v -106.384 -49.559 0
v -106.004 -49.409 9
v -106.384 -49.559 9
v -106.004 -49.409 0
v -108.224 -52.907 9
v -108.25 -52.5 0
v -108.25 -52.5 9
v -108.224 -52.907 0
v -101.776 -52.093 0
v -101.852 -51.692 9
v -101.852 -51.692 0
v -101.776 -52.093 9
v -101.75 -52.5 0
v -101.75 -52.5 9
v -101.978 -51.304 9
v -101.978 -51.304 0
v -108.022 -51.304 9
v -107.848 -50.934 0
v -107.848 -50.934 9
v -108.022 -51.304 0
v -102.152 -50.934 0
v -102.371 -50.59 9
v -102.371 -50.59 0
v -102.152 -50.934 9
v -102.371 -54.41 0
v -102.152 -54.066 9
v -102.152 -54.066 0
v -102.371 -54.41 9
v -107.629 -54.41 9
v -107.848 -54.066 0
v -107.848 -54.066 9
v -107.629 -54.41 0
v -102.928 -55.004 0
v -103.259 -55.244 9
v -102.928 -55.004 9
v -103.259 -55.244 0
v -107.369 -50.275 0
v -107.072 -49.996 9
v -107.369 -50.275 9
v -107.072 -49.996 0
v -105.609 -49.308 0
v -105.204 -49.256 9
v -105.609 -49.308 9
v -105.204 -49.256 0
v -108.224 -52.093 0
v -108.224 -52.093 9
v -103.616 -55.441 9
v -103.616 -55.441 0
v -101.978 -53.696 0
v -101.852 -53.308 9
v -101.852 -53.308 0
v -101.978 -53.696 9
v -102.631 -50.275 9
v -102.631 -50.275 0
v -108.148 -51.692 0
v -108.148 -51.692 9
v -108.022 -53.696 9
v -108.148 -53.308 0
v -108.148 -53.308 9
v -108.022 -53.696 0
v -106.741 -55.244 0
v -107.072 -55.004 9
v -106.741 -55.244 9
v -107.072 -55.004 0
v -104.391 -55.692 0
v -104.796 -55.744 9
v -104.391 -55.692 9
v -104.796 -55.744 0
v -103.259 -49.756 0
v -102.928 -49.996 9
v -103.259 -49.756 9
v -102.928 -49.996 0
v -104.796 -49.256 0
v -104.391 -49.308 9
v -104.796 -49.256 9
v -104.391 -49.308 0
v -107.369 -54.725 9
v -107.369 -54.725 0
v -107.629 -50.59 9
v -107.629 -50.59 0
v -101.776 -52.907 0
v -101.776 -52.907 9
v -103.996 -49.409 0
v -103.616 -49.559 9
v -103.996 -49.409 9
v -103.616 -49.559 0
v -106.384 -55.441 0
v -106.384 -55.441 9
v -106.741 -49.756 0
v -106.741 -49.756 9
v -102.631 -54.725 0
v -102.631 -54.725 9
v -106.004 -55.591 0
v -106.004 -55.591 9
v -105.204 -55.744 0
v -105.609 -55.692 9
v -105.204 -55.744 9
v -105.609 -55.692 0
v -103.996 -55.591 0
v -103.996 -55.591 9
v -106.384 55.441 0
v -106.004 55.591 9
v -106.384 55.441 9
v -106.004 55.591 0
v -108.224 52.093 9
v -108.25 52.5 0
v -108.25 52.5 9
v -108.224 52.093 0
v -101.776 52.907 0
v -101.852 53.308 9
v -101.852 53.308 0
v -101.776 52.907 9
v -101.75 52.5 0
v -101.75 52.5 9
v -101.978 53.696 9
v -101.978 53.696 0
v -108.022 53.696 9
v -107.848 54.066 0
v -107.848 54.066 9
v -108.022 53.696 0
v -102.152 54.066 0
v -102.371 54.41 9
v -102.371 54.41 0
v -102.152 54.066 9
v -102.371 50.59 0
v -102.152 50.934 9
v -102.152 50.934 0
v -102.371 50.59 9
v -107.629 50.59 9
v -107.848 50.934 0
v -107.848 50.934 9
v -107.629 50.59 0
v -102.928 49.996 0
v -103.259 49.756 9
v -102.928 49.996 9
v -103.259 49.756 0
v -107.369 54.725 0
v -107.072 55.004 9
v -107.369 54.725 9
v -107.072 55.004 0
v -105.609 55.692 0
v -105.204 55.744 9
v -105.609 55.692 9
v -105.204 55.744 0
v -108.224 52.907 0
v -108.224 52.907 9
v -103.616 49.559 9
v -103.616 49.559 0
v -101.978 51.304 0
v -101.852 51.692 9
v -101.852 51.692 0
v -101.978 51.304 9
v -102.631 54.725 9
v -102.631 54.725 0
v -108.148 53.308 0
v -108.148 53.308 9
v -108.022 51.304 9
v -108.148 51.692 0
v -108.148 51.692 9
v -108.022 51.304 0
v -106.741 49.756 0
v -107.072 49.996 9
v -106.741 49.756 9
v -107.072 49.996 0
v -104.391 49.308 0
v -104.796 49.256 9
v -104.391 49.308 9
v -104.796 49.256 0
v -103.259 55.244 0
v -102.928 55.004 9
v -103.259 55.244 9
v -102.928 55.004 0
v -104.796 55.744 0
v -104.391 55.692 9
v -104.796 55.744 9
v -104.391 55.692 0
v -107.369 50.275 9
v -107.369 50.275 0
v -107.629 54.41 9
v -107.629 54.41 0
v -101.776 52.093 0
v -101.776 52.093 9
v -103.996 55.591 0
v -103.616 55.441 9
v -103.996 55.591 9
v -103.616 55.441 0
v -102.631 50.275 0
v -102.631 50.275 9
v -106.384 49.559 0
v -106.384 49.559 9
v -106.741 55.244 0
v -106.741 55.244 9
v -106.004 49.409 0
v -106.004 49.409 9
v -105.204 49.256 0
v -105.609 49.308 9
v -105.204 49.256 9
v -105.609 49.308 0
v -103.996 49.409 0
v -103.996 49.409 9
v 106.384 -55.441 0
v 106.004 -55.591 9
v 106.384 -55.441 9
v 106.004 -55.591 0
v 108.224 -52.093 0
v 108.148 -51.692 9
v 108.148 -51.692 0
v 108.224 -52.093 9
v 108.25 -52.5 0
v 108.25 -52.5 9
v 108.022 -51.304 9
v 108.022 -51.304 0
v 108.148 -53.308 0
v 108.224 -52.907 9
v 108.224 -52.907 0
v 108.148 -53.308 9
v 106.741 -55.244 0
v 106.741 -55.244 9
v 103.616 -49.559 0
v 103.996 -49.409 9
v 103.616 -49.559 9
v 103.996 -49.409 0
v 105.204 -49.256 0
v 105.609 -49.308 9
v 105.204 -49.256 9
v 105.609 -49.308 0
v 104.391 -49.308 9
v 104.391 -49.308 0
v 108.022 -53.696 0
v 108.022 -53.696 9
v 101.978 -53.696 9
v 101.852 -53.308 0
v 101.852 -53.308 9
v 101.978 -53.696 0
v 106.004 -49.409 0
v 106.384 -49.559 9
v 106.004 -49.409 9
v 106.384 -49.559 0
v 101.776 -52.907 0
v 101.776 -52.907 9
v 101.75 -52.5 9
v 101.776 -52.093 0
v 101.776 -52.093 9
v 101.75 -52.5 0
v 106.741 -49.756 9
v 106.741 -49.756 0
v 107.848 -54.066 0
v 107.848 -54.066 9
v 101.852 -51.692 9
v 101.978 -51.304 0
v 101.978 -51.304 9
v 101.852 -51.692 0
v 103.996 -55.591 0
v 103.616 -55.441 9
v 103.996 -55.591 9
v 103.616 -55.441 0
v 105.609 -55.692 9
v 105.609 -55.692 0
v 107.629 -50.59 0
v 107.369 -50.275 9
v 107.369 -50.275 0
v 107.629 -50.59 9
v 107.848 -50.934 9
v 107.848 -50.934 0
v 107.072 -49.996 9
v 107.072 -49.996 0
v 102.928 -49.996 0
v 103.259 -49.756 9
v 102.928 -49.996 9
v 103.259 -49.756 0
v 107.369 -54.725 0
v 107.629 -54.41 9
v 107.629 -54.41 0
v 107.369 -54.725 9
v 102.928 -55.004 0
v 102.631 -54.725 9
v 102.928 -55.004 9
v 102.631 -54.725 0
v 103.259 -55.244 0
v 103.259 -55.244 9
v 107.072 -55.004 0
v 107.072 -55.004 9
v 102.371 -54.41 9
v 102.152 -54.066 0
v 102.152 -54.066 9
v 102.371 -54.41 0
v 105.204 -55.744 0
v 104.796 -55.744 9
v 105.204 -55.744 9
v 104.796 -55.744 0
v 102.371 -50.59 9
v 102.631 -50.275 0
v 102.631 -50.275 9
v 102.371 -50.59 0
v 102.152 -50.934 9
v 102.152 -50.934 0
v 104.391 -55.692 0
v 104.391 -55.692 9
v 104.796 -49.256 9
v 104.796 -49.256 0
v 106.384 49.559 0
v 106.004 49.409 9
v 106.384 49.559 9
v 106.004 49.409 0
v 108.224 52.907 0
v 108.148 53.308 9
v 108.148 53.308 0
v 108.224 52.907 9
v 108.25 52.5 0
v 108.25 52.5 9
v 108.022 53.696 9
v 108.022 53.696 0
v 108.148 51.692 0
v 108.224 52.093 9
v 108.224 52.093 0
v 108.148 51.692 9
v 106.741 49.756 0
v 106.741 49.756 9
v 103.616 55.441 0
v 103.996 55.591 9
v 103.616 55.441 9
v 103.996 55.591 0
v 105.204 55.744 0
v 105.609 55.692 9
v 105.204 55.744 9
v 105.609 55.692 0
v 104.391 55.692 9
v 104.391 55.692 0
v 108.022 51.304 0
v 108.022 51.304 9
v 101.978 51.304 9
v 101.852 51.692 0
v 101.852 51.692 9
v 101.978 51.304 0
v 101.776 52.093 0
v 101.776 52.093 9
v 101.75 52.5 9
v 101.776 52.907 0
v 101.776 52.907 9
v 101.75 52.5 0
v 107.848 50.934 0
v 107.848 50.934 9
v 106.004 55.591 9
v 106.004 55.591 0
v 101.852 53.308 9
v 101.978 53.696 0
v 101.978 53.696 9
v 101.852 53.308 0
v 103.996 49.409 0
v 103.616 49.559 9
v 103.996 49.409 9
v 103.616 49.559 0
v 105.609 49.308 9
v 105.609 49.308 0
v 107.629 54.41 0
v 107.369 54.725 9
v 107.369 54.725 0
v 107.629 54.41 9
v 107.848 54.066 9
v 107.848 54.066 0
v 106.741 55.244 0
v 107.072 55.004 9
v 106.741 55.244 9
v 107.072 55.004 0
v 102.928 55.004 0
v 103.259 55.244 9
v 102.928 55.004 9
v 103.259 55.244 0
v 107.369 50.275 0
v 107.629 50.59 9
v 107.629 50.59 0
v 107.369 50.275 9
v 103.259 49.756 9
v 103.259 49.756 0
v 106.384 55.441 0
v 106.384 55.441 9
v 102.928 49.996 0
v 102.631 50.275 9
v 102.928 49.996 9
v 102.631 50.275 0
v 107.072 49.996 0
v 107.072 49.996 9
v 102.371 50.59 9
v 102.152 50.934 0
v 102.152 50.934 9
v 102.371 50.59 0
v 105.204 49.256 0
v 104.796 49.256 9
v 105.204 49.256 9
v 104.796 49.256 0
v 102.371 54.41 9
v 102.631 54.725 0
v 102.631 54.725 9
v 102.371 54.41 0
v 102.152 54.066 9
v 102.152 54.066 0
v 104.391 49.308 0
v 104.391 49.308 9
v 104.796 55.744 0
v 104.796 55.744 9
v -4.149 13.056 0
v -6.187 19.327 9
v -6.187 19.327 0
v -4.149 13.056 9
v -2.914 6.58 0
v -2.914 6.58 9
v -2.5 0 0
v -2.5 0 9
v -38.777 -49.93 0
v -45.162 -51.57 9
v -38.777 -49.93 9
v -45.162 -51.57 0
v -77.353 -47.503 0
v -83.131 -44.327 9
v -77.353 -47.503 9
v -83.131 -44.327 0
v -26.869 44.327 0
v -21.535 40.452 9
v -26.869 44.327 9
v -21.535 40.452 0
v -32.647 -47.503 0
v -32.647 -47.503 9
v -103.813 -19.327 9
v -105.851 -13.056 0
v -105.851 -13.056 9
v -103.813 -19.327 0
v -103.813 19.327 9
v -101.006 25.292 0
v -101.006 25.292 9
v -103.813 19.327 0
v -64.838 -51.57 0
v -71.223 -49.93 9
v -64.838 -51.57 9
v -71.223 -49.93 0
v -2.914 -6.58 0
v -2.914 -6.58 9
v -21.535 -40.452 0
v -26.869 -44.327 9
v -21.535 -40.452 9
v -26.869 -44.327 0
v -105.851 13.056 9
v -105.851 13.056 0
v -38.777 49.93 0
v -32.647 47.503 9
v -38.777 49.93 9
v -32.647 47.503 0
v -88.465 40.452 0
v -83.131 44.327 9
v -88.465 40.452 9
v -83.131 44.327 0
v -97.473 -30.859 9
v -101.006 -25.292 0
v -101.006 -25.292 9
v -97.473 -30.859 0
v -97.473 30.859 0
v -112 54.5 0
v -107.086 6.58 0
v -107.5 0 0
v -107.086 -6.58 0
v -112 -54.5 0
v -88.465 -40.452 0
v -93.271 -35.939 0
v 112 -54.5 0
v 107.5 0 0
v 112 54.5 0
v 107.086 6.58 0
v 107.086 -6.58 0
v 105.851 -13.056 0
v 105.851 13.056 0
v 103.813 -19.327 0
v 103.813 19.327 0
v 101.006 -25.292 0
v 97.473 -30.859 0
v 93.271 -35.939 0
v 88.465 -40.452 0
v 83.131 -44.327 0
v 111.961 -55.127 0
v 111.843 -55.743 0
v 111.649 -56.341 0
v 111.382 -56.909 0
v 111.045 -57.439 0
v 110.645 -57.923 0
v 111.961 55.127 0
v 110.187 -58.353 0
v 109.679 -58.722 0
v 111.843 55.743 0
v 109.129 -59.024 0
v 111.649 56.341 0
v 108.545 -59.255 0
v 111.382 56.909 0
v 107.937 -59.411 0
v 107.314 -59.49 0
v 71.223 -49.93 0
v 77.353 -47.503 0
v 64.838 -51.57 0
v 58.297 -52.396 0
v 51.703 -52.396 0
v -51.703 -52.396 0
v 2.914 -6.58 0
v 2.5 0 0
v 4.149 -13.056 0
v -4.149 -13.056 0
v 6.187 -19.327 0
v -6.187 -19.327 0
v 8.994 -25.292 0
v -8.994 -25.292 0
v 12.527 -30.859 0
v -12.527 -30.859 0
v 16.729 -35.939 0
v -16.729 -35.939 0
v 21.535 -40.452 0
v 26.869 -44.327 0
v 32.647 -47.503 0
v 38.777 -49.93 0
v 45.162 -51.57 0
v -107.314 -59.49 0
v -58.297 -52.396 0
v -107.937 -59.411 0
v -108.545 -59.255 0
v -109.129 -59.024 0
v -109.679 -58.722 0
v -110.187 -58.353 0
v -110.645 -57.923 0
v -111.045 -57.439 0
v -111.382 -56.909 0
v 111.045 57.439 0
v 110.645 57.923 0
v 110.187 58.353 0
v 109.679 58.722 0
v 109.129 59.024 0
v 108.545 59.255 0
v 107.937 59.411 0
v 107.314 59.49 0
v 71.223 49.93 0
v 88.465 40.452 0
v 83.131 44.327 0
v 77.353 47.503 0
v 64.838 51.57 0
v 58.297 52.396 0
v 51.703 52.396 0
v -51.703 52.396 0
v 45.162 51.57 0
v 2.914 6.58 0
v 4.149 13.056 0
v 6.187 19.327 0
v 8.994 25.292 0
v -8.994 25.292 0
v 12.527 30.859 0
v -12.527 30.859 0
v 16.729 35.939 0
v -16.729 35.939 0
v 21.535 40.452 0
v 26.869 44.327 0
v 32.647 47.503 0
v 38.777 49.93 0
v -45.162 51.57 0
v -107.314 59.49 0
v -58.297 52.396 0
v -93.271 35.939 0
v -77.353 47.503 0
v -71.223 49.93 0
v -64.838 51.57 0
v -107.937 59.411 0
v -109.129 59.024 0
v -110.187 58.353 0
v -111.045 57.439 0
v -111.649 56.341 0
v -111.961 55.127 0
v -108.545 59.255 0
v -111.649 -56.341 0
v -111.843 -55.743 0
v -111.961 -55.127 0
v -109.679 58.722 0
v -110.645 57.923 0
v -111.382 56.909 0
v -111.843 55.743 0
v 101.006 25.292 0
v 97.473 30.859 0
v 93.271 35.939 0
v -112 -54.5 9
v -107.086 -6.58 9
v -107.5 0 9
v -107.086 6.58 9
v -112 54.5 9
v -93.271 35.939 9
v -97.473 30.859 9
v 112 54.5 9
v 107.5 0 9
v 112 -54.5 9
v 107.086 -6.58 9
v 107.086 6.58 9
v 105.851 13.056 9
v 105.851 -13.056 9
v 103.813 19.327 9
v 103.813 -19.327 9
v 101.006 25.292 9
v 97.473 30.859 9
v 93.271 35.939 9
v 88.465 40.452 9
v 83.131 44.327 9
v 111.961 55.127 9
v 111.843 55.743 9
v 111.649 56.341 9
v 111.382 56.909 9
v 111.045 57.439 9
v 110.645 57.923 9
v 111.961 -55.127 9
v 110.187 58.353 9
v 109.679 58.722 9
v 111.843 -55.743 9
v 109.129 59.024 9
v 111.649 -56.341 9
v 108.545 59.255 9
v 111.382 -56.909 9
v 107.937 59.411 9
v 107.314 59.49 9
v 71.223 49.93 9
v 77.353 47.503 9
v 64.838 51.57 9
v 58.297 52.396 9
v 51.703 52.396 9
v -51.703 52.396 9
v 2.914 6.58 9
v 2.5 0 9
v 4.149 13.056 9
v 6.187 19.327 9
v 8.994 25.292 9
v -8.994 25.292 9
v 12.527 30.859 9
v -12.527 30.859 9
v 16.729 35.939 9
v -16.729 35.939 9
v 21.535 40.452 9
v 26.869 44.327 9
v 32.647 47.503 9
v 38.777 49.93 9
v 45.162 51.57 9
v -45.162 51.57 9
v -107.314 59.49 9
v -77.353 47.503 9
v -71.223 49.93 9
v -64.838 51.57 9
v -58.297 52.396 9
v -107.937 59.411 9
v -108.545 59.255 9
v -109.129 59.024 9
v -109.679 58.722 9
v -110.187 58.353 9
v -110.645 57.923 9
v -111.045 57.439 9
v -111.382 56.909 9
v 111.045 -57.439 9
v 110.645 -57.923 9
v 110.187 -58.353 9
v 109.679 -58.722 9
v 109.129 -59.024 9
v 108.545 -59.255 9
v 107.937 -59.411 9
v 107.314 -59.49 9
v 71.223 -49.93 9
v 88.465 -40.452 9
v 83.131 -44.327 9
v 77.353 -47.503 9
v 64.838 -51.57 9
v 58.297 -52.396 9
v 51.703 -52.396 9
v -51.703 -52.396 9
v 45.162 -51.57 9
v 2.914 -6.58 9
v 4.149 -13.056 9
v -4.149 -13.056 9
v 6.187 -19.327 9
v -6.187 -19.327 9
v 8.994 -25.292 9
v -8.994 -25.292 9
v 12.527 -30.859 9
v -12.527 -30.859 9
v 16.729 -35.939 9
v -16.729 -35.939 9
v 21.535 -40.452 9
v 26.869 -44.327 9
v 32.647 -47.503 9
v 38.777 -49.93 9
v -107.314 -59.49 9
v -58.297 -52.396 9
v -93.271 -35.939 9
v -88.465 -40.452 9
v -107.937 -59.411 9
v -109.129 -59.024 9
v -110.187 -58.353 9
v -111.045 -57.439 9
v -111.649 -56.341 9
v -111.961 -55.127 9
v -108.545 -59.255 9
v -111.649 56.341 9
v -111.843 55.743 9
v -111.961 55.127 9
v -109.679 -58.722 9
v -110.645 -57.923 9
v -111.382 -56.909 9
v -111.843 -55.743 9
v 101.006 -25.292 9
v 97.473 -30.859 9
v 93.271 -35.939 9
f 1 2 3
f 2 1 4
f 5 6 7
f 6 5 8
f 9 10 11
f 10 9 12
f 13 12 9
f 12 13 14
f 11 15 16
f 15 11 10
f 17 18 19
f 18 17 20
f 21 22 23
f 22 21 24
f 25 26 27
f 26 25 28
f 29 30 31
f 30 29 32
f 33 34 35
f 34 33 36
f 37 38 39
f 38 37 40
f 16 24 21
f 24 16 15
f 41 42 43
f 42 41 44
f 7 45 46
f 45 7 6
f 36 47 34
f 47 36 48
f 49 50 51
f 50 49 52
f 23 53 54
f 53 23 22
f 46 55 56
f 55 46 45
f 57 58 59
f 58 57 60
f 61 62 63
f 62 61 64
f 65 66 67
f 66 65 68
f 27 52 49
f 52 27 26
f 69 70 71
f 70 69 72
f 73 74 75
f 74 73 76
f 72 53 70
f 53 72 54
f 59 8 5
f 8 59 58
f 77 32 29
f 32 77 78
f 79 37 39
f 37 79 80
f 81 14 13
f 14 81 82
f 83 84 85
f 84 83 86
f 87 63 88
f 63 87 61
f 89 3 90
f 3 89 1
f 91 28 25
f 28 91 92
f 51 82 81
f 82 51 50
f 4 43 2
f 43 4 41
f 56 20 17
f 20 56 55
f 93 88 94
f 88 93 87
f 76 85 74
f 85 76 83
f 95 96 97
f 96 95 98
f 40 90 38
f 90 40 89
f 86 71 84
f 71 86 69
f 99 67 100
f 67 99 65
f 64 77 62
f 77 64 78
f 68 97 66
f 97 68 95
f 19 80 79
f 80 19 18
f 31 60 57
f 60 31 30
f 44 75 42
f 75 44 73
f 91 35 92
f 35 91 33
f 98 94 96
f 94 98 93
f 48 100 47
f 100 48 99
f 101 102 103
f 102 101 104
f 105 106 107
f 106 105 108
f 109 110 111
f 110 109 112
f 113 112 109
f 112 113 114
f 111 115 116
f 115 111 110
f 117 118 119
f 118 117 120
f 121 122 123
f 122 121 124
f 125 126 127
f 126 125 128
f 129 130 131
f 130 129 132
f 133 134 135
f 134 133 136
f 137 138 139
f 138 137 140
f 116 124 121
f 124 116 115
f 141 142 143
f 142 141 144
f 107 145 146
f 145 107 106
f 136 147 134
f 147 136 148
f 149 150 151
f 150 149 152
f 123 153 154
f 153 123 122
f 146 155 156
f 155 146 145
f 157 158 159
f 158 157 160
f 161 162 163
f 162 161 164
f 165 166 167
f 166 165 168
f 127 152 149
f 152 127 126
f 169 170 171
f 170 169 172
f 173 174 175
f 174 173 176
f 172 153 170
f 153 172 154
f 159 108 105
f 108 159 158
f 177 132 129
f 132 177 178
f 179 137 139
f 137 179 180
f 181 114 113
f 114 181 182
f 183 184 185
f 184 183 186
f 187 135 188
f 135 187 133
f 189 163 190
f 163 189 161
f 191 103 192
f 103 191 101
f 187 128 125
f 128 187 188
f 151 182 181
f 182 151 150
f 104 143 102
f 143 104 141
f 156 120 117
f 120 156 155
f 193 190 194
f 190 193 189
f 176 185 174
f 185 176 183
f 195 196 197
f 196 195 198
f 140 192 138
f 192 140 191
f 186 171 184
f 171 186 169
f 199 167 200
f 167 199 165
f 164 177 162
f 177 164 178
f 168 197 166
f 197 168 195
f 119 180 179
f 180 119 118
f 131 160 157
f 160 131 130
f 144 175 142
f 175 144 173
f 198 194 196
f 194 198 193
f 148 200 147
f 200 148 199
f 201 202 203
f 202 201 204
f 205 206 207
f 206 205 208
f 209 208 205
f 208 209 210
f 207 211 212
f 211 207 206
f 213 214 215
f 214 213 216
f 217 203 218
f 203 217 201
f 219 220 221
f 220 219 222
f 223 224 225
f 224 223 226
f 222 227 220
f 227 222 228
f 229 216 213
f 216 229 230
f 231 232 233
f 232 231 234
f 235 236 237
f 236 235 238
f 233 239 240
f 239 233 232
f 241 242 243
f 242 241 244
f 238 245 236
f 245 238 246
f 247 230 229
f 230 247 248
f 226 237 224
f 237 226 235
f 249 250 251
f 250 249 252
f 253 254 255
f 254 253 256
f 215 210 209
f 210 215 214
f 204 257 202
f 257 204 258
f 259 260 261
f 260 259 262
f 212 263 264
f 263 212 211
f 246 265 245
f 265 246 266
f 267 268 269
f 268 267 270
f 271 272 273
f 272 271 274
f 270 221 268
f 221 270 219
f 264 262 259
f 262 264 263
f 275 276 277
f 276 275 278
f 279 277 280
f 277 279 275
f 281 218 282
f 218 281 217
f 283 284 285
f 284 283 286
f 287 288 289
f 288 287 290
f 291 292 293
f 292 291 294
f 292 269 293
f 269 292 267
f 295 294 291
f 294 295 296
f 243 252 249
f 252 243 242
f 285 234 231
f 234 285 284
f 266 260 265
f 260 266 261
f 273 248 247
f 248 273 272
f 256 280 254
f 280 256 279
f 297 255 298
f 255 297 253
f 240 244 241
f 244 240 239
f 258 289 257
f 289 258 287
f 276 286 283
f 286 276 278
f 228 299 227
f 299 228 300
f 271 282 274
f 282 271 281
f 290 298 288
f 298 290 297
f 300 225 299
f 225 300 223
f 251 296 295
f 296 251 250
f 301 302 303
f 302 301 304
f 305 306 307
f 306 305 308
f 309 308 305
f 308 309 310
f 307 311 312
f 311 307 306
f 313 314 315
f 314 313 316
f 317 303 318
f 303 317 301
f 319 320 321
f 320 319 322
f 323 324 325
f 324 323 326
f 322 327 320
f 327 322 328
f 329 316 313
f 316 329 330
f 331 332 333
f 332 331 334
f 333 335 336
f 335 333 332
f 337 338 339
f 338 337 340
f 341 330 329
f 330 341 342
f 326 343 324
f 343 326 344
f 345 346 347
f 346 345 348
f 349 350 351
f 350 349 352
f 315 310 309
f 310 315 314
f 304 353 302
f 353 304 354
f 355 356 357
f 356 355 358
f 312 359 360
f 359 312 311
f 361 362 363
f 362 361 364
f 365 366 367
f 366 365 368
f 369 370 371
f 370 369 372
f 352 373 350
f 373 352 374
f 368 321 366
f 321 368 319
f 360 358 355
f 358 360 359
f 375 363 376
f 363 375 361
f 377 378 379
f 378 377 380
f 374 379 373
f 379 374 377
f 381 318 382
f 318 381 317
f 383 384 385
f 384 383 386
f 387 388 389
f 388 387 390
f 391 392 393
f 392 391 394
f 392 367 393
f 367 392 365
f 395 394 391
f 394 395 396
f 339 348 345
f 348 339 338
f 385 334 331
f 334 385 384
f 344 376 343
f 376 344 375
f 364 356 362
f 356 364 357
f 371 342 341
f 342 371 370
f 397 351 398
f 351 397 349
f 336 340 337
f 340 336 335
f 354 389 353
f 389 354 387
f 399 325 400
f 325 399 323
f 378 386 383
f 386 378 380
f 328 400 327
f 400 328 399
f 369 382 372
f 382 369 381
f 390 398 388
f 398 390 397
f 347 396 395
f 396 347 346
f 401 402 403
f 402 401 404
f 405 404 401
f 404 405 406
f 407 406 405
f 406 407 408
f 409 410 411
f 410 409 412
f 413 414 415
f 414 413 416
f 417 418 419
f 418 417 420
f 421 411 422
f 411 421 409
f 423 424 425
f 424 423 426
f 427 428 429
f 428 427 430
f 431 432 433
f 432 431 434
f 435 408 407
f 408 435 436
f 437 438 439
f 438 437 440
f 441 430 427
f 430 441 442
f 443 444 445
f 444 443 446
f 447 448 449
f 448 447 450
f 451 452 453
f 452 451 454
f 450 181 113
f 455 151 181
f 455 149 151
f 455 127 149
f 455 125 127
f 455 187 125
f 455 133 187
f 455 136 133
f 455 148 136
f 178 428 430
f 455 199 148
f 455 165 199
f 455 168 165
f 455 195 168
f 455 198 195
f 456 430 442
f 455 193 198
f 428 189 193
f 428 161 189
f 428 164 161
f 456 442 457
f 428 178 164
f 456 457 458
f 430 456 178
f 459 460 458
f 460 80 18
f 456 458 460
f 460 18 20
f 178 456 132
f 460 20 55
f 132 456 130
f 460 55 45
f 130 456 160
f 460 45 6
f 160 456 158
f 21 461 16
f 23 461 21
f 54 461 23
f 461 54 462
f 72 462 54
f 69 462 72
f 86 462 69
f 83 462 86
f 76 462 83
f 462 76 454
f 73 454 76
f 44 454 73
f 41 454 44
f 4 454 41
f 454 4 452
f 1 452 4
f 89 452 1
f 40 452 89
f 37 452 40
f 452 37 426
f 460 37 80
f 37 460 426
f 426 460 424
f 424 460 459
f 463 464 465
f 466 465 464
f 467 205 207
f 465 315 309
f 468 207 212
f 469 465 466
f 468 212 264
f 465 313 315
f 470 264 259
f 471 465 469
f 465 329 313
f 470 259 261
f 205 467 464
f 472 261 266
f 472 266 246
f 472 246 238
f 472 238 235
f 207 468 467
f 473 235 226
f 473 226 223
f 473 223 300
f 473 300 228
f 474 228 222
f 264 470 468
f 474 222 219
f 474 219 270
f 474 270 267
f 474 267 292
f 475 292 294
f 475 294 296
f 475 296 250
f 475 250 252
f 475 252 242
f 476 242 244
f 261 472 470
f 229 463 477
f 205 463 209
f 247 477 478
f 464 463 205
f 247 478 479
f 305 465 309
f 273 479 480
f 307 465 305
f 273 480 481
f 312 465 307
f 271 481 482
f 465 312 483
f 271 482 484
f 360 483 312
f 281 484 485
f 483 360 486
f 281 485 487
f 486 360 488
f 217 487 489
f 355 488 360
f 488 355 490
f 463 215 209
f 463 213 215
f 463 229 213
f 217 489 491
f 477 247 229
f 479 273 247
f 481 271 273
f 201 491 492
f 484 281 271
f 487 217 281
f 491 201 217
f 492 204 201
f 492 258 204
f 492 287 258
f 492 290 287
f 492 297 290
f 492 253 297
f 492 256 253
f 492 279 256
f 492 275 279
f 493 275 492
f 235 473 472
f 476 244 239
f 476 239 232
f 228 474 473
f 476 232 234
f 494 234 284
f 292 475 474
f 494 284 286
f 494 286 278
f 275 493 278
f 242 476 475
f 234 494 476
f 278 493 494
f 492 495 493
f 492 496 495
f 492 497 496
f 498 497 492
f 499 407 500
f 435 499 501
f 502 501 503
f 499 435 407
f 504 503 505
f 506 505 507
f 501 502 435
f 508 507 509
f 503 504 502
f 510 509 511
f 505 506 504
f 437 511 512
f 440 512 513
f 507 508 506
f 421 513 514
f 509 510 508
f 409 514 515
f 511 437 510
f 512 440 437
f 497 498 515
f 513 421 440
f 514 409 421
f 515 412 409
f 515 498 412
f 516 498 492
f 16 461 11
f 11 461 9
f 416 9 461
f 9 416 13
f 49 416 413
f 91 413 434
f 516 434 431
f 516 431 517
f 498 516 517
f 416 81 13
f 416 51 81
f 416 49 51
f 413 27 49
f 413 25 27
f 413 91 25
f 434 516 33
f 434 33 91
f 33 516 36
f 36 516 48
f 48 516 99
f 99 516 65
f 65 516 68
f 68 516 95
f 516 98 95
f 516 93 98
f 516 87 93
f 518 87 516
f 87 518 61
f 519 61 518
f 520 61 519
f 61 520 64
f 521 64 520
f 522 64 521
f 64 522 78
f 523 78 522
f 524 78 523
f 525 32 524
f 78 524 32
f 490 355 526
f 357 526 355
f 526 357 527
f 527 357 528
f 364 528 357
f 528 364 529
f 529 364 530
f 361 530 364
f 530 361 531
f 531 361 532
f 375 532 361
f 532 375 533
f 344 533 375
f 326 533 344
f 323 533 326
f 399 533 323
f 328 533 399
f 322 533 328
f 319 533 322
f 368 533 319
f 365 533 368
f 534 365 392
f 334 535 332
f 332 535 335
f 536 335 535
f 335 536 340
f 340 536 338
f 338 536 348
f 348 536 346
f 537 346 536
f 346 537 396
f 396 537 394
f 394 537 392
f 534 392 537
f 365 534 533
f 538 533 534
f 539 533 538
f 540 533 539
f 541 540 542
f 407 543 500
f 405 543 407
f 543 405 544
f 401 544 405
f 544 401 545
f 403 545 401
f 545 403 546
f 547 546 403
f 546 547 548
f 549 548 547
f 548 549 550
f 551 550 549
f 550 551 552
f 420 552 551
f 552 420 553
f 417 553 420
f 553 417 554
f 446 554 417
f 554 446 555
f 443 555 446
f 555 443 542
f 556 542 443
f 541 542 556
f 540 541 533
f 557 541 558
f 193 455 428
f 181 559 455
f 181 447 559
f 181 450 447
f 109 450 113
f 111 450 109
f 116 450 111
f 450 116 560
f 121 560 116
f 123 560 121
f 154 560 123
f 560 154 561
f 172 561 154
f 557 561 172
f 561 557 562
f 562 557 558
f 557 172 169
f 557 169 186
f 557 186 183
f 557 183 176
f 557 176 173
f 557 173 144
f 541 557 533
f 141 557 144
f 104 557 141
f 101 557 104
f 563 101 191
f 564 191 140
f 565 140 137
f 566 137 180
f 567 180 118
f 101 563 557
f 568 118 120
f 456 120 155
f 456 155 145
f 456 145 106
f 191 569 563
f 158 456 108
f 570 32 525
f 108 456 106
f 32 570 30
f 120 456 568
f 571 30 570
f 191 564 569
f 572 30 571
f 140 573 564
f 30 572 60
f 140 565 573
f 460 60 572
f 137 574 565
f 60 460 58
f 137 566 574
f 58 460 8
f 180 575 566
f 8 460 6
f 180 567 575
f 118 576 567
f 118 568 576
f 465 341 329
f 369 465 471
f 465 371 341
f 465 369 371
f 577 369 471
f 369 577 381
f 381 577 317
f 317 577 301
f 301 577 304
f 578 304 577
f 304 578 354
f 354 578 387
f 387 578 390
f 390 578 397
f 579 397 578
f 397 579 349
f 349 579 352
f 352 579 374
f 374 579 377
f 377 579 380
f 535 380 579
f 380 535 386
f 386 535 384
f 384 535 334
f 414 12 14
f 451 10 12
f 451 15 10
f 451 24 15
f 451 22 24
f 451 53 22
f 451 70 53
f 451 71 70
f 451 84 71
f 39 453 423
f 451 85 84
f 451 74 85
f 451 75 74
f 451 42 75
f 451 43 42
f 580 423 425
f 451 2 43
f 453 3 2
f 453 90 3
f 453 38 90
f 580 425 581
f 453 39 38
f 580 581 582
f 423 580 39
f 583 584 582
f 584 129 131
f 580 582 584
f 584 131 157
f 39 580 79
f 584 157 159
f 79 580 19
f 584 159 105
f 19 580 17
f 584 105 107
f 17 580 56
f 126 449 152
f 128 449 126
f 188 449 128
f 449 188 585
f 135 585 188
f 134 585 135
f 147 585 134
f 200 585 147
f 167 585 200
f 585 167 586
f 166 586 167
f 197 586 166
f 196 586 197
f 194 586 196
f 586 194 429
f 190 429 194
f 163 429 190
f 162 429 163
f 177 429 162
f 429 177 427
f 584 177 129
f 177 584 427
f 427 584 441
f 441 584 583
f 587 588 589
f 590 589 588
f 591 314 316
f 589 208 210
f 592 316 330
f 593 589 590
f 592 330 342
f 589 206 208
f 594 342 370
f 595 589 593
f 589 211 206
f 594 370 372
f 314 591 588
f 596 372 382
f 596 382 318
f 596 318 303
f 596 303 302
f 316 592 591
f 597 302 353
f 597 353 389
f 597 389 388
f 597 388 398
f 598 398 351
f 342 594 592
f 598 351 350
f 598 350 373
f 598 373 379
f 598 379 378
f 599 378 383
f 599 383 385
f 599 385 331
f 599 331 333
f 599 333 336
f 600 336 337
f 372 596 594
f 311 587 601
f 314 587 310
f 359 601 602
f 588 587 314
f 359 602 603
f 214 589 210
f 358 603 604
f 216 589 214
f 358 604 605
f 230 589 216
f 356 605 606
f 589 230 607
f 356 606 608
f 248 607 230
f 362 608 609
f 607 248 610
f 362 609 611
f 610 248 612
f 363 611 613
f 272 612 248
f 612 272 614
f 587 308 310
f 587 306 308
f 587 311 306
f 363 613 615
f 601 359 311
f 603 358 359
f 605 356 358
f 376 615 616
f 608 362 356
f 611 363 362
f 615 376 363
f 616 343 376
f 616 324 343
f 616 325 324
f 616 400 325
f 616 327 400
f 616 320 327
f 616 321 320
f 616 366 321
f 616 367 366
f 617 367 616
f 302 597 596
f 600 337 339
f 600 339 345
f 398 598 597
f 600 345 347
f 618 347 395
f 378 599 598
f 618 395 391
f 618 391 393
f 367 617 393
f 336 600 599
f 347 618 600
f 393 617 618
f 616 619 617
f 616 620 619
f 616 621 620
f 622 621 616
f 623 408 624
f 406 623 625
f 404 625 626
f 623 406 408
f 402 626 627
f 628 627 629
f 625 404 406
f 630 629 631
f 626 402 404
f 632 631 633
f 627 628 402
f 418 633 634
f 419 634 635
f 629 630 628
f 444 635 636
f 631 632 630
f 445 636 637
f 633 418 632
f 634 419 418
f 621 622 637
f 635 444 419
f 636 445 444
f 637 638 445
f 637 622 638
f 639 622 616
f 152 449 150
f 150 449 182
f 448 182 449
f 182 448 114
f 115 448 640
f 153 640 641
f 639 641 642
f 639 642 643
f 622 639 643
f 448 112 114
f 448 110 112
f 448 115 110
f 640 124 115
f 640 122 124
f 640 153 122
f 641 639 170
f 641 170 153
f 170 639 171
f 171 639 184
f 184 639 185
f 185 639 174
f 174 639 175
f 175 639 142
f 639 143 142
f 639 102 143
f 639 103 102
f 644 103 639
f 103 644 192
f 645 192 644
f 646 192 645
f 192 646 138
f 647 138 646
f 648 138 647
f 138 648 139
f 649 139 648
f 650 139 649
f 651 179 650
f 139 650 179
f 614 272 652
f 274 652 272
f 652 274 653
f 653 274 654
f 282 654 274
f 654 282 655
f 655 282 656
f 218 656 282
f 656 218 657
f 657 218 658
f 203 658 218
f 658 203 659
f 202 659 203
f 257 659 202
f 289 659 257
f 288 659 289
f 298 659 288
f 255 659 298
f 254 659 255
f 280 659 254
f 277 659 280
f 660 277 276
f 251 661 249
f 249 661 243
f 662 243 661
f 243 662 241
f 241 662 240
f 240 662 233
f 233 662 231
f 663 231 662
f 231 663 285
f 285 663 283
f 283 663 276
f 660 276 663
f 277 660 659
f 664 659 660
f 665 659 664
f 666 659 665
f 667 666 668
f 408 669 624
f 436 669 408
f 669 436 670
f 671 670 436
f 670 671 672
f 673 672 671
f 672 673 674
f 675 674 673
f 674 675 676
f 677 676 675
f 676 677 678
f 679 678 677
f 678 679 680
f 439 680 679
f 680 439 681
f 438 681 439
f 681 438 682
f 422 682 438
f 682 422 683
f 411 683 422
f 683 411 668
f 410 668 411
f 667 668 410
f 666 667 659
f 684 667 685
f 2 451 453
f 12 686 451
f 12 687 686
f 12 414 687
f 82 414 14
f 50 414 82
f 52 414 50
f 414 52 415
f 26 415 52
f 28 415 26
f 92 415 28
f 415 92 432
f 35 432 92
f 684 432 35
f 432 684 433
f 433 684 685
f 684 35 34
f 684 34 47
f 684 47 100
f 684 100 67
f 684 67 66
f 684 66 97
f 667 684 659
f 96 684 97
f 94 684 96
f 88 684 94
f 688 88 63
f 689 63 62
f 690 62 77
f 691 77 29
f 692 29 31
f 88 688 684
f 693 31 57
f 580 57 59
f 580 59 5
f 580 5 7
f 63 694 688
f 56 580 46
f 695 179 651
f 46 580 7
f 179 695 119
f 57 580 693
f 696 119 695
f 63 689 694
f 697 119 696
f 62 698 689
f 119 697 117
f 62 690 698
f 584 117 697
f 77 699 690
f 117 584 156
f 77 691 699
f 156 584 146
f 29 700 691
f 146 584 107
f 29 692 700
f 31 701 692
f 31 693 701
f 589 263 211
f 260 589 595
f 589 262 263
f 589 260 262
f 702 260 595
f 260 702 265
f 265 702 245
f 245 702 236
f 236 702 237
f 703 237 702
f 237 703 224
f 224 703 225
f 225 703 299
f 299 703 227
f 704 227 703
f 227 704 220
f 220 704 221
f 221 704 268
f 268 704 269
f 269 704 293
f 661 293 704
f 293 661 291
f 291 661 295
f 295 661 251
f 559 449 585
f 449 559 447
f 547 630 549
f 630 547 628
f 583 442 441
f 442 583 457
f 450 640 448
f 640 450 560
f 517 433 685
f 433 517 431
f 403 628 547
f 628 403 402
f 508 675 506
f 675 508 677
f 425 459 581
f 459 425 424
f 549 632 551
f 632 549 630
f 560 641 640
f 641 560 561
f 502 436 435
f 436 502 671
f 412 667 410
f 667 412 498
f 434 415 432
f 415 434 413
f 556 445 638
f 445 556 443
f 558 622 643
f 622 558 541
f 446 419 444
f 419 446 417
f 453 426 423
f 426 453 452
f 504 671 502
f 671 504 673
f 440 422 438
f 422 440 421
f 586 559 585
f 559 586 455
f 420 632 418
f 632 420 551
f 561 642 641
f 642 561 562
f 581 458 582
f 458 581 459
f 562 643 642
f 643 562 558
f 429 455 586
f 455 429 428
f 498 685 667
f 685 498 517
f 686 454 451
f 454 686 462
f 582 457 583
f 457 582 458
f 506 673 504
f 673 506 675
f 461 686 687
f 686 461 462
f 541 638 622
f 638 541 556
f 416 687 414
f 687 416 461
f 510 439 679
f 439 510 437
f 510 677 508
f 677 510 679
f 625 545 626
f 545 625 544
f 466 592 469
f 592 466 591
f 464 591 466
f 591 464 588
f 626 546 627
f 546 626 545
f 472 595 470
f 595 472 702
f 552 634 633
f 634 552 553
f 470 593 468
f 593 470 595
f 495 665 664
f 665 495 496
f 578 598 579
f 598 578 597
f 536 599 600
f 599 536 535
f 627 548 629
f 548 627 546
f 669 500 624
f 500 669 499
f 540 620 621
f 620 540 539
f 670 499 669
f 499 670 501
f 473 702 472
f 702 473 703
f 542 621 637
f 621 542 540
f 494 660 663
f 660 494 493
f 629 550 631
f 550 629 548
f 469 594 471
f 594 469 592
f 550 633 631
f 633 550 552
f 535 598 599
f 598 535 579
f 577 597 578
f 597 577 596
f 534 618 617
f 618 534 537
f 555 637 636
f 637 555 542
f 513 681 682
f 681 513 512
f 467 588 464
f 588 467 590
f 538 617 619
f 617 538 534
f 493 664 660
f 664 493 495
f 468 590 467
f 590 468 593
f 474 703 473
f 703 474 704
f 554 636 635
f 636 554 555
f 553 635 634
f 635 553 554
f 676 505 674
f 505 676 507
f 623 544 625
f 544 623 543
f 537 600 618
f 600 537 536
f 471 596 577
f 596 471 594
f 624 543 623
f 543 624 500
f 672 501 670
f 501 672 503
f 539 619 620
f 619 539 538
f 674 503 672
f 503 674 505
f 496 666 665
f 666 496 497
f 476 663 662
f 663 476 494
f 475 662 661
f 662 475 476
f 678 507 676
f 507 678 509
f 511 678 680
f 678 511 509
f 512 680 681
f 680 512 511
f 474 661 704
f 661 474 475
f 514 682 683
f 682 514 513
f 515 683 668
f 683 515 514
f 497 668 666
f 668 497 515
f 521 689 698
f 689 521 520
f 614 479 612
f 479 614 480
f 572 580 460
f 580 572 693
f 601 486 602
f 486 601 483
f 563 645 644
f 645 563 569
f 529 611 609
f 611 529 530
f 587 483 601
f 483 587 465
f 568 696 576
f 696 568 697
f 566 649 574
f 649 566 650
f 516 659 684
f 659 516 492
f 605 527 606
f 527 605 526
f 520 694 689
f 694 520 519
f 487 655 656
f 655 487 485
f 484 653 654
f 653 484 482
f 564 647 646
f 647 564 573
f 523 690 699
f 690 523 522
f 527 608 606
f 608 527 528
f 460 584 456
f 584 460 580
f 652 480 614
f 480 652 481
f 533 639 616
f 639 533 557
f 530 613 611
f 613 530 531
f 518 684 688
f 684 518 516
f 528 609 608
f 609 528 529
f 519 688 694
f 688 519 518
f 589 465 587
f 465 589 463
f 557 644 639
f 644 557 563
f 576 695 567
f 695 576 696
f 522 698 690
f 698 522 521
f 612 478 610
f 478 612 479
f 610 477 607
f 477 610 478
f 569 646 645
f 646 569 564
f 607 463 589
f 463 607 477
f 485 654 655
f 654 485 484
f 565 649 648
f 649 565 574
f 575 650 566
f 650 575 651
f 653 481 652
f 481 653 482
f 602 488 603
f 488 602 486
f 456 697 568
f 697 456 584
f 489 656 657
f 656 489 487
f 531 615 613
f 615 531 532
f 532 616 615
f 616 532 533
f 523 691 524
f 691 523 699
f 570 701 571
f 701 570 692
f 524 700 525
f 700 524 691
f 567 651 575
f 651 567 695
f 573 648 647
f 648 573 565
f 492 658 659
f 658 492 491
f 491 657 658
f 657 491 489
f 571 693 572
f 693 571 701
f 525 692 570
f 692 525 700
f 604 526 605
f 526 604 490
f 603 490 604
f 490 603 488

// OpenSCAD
$fn = 50;

difference() {
	union() {
		hull() {
			translate(v = [-107.0, 54.5, 0]) {
				cylinder(h = 9, r = 5);
			}
			translate(v = [107.0, 54.5, 0]) {
				cylinder(h = 9, r = 5);
			}
			translate(v = [-107.0, -54.5, 0]) {
				cylinder(h = 9, r = 5);
			}
			translate(v = [107.0, -54.5, 0]) {
				cylinder(h = 9, r = 5);
			}
		}
	}
	union() {
		translate(v = [-105.0, -52.5, -100.0]) {
			cylinder(h = 200, r = 3.25);
		}
		translate(v = [-105.0, 52.5, -100.0]) {
			cylinder(h = 200, r = 3.25);
		}
		translate(v = [105.0, -52.5, -100.0]) {
			cylinder(h = 200, r = 3.25);
		}
		translate(v = [105.0, 52.5, -100.0]) {
			cylinder(h = 200, r = 3.25);
		}
		translate(v = [-105.0, -52.5, -100.0]) {
			cylinder(h = 200, r = 1.8);
		}
		translate(v = [-105.0, 52.5, -100.0]) {
			cylinder(h = 200, r = 1.8);
		}
		translate(v = [105.0, -52.5, -100.0]) {
			cylinder(h = 200, r = 1.8);
		}
		translate(v = [105.0, 52.5, -100.0]) {
			cylinder(h = 200, r = 1.8);
		}
		translate(v = [-55.0, 0, 0.0]) {
			cylinder(h = 9, r = 52.5);
		}
		translate(v = [55.0, 0, 0.0]) {
			cylinder(h = 9, r = 52.5);
		}
	}
}
